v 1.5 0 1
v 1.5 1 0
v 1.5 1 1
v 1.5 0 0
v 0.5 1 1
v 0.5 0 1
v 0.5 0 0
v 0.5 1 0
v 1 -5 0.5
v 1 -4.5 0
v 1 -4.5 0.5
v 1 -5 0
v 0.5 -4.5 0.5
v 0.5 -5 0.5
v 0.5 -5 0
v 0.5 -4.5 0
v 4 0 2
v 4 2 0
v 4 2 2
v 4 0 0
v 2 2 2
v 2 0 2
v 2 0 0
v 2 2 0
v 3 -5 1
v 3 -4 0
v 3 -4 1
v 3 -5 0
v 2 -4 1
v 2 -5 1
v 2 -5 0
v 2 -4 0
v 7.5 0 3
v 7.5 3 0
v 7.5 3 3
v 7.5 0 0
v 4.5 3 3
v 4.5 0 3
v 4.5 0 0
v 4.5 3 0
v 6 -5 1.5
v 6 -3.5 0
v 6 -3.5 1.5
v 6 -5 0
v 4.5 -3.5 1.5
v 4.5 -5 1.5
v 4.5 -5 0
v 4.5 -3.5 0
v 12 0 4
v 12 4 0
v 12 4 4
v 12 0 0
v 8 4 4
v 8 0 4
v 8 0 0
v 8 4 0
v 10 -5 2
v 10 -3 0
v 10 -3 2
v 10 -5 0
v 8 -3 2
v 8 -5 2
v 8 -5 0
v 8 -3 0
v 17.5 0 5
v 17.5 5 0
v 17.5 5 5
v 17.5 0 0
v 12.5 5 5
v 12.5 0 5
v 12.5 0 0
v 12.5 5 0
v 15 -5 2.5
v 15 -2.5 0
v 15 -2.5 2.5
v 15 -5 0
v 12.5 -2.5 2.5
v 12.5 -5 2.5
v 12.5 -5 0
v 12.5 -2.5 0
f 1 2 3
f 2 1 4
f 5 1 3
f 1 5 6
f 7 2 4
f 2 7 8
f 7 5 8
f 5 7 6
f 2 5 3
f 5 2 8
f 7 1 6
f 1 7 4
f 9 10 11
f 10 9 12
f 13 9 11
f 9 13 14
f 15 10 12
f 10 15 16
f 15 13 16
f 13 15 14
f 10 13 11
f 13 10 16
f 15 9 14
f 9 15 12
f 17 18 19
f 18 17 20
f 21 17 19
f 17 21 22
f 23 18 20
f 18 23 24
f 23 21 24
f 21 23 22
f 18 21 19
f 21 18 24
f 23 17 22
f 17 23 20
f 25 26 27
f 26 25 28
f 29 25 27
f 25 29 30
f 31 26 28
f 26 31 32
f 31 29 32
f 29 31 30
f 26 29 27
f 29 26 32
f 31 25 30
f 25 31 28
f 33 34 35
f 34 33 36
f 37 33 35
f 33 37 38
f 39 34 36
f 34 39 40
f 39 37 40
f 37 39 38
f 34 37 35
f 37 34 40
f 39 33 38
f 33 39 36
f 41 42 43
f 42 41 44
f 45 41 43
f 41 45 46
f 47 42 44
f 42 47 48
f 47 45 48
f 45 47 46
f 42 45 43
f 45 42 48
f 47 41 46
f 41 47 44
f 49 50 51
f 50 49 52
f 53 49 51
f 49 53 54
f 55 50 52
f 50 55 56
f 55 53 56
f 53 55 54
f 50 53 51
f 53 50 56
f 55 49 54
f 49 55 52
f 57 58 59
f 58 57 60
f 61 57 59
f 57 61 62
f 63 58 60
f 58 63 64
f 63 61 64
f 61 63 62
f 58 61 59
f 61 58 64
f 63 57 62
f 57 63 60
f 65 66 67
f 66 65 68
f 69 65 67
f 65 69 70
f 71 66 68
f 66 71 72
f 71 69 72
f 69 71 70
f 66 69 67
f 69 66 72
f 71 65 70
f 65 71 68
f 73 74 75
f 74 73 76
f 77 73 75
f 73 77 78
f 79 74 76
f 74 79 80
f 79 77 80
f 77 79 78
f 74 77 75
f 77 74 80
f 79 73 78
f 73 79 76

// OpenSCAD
for(i=[0:5]) {
  translate([i*i/2,0,0]) {
    cube(i);
    translate([0,-5,0]) assign(f=1.0*i/2) cube(f);
  }
}
